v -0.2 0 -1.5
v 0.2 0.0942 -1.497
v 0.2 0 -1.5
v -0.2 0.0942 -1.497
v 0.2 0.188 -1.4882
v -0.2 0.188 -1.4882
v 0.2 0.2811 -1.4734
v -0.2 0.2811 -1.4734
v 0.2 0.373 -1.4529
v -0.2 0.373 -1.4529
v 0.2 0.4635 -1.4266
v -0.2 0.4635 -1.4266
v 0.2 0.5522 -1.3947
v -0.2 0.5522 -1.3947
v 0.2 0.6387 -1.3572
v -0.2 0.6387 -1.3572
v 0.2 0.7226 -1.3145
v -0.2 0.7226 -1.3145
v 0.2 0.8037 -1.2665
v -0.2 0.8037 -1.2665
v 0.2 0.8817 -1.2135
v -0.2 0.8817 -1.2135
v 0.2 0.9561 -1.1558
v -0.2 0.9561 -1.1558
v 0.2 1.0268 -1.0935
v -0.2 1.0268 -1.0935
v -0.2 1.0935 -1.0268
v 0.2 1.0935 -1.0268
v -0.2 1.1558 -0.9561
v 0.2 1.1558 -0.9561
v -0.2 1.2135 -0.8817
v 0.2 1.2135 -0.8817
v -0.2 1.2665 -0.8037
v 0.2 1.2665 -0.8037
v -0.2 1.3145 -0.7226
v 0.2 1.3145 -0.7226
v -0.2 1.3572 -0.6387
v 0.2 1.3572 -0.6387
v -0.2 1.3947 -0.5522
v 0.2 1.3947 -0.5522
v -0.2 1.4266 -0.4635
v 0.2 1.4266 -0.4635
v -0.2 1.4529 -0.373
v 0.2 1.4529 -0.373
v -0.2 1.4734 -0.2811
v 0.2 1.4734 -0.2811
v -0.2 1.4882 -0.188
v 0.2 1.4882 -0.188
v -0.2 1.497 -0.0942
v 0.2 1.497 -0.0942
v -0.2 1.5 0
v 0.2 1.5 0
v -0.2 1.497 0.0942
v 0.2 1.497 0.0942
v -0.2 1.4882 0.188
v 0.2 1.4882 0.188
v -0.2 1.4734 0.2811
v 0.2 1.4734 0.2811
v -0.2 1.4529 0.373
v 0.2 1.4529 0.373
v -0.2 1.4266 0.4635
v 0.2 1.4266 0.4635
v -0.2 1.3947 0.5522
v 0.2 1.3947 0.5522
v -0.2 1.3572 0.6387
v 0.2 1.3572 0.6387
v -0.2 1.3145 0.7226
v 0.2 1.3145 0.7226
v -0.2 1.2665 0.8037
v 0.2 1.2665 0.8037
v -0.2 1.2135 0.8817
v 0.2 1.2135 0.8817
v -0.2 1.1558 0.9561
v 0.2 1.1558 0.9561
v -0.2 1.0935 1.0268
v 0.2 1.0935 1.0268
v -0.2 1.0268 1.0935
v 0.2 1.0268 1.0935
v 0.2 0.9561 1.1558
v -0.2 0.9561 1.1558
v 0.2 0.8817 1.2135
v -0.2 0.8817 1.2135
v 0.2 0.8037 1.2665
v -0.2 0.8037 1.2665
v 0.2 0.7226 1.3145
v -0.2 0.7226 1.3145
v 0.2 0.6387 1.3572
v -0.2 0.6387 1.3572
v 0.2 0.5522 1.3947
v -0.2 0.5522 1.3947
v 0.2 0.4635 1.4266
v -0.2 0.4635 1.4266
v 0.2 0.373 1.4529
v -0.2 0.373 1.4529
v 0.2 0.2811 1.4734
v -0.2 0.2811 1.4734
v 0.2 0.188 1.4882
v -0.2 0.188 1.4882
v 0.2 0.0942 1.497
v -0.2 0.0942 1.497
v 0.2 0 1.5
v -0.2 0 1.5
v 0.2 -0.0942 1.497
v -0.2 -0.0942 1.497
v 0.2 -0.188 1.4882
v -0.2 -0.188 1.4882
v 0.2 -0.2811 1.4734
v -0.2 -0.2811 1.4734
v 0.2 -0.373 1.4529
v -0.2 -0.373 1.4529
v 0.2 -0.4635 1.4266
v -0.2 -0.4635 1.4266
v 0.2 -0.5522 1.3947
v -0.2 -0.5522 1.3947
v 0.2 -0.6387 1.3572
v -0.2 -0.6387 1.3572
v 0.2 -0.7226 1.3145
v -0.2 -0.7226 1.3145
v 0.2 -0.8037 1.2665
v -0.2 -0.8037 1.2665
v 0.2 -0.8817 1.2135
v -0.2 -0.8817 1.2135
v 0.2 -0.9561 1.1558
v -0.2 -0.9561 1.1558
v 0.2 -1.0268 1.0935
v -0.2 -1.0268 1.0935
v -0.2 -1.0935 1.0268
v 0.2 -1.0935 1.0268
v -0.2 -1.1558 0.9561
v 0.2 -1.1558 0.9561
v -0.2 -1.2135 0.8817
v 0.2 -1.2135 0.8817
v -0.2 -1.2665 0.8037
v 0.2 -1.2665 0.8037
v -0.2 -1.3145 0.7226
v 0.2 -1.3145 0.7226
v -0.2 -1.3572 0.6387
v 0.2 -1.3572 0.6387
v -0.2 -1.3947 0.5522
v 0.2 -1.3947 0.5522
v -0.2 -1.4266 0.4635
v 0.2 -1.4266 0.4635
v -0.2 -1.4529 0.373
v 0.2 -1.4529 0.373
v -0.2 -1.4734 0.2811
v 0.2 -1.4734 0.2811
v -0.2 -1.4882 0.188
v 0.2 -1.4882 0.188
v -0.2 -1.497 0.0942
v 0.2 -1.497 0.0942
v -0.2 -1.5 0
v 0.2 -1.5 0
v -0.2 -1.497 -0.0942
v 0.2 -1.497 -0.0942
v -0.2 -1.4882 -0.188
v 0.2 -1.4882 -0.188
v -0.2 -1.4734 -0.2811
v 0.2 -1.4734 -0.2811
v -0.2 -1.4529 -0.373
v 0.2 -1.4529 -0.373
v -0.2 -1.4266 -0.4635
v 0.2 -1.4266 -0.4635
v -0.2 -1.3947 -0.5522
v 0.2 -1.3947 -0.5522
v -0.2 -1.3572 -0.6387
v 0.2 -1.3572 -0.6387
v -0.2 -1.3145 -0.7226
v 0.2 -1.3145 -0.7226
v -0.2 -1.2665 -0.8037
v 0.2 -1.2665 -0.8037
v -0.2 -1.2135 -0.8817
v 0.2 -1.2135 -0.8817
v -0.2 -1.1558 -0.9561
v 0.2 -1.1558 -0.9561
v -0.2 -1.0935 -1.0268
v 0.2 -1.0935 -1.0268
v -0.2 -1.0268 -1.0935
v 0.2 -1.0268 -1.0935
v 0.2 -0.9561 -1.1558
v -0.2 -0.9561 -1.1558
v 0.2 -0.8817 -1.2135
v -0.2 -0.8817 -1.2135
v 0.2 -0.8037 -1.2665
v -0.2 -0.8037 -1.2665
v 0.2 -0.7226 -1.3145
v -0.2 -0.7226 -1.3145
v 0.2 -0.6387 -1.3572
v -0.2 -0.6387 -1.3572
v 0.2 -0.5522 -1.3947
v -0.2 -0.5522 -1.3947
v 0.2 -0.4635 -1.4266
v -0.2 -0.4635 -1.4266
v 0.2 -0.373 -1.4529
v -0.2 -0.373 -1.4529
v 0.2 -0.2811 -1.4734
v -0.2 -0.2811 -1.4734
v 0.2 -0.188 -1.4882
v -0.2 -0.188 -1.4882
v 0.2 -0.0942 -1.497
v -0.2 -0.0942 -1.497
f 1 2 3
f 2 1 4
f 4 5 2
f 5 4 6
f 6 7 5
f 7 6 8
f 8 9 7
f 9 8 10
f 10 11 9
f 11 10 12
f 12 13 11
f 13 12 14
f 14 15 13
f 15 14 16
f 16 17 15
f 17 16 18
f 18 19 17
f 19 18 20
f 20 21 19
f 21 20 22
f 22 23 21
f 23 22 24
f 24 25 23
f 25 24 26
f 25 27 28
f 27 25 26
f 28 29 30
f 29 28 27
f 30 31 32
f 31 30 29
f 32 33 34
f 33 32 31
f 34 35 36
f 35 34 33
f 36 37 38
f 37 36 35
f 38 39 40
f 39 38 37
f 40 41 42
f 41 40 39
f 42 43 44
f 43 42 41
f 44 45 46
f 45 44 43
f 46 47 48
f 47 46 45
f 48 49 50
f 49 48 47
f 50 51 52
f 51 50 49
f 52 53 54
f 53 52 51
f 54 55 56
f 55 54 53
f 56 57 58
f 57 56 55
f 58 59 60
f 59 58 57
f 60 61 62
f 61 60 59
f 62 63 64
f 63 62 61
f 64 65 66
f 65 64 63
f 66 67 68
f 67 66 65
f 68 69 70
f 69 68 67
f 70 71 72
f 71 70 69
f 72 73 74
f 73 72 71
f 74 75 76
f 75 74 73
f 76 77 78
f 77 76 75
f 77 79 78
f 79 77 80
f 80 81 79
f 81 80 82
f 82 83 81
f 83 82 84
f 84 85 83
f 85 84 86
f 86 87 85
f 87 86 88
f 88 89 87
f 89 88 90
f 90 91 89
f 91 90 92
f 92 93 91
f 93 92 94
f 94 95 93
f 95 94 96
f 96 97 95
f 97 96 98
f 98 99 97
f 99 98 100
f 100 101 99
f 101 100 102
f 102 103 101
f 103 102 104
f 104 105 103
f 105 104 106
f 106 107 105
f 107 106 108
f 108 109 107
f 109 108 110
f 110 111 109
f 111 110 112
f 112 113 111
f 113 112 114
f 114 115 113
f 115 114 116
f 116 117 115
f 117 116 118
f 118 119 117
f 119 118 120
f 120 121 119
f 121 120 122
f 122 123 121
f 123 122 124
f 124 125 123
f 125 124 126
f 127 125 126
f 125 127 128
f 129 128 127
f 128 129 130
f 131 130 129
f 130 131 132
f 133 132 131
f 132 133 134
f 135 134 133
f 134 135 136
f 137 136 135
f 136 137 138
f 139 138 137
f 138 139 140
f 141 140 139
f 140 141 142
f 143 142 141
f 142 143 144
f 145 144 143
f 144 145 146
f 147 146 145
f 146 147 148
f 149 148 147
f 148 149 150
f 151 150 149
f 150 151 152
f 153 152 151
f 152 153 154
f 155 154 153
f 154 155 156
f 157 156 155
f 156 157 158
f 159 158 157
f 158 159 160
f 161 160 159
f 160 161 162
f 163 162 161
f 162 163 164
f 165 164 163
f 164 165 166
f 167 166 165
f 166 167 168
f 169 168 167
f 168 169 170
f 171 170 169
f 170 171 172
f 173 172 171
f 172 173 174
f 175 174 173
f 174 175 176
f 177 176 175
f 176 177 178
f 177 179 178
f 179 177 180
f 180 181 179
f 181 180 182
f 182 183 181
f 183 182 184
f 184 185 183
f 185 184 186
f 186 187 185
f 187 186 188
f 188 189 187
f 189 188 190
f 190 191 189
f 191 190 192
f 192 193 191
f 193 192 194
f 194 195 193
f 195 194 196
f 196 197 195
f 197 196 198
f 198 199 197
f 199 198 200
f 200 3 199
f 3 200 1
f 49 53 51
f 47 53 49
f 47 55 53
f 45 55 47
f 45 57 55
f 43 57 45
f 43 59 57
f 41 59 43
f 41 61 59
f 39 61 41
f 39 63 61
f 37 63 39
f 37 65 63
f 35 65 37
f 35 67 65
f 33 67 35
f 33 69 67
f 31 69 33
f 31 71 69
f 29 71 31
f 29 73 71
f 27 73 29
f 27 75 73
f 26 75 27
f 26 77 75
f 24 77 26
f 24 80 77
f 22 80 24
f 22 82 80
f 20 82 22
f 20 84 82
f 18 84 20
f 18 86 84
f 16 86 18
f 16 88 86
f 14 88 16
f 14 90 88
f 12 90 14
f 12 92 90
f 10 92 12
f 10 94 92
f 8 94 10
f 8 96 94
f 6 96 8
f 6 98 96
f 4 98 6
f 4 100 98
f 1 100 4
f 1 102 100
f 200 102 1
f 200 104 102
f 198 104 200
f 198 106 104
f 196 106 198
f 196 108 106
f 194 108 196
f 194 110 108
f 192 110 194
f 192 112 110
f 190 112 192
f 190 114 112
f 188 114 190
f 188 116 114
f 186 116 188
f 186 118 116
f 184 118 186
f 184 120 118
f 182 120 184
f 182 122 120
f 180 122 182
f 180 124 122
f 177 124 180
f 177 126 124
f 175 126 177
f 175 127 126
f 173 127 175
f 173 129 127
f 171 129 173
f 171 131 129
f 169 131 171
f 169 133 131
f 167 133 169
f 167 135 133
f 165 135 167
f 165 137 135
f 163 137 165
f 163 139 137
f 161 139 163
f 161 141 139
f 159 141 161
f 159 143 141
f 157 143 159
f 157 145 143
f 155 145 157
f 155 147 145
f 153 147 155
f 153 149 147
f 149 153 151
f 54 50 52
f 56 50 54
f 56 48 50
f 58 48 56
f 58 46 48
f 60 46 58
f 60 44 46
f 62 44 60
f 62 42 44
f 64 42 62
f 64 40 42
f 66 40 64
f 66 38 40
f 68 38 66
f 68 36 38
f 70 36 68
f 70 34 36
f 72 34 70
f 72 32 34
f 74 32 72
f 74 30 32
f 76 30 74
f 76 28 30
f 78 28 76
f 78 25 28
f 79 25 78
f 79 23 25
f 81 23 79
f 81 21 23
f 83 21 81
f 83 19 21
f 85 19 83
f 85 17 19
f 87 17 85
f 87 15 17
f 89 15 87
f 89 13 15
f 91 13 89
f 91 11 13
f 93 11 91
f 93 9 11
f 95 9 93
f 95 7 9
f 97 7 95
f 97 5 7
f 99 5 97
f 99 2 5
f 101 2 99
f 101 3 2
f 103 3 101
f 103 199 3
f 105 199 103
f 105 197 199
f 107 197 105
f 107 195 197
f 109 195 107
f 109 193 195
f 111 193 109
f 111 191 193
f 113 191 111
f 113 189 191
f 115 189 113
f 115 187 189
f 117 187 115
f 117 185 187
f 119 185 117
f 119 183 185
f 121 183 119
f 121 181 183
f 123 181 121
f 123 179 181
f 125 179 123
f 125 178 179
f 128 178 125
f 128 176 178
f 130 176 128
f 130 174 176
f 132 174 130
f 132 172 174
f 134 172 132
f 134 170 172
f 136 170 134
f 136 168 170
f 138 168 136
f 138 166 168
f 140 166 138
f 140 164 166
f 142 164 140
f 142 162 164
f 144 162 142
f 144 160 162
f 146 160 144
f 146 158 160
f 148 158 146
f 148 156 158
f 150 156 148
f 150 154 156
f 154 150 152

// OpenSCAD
size_per = 1/100;

tekerlek(rad=150*size_per, gen=40*size_per);

module tekerlek(rad=150, gen=20, $fn=100){
    translate([-gen/2,0,0]) rotate([0,90,0]) cylinder(h=gen,r=rad);
}
